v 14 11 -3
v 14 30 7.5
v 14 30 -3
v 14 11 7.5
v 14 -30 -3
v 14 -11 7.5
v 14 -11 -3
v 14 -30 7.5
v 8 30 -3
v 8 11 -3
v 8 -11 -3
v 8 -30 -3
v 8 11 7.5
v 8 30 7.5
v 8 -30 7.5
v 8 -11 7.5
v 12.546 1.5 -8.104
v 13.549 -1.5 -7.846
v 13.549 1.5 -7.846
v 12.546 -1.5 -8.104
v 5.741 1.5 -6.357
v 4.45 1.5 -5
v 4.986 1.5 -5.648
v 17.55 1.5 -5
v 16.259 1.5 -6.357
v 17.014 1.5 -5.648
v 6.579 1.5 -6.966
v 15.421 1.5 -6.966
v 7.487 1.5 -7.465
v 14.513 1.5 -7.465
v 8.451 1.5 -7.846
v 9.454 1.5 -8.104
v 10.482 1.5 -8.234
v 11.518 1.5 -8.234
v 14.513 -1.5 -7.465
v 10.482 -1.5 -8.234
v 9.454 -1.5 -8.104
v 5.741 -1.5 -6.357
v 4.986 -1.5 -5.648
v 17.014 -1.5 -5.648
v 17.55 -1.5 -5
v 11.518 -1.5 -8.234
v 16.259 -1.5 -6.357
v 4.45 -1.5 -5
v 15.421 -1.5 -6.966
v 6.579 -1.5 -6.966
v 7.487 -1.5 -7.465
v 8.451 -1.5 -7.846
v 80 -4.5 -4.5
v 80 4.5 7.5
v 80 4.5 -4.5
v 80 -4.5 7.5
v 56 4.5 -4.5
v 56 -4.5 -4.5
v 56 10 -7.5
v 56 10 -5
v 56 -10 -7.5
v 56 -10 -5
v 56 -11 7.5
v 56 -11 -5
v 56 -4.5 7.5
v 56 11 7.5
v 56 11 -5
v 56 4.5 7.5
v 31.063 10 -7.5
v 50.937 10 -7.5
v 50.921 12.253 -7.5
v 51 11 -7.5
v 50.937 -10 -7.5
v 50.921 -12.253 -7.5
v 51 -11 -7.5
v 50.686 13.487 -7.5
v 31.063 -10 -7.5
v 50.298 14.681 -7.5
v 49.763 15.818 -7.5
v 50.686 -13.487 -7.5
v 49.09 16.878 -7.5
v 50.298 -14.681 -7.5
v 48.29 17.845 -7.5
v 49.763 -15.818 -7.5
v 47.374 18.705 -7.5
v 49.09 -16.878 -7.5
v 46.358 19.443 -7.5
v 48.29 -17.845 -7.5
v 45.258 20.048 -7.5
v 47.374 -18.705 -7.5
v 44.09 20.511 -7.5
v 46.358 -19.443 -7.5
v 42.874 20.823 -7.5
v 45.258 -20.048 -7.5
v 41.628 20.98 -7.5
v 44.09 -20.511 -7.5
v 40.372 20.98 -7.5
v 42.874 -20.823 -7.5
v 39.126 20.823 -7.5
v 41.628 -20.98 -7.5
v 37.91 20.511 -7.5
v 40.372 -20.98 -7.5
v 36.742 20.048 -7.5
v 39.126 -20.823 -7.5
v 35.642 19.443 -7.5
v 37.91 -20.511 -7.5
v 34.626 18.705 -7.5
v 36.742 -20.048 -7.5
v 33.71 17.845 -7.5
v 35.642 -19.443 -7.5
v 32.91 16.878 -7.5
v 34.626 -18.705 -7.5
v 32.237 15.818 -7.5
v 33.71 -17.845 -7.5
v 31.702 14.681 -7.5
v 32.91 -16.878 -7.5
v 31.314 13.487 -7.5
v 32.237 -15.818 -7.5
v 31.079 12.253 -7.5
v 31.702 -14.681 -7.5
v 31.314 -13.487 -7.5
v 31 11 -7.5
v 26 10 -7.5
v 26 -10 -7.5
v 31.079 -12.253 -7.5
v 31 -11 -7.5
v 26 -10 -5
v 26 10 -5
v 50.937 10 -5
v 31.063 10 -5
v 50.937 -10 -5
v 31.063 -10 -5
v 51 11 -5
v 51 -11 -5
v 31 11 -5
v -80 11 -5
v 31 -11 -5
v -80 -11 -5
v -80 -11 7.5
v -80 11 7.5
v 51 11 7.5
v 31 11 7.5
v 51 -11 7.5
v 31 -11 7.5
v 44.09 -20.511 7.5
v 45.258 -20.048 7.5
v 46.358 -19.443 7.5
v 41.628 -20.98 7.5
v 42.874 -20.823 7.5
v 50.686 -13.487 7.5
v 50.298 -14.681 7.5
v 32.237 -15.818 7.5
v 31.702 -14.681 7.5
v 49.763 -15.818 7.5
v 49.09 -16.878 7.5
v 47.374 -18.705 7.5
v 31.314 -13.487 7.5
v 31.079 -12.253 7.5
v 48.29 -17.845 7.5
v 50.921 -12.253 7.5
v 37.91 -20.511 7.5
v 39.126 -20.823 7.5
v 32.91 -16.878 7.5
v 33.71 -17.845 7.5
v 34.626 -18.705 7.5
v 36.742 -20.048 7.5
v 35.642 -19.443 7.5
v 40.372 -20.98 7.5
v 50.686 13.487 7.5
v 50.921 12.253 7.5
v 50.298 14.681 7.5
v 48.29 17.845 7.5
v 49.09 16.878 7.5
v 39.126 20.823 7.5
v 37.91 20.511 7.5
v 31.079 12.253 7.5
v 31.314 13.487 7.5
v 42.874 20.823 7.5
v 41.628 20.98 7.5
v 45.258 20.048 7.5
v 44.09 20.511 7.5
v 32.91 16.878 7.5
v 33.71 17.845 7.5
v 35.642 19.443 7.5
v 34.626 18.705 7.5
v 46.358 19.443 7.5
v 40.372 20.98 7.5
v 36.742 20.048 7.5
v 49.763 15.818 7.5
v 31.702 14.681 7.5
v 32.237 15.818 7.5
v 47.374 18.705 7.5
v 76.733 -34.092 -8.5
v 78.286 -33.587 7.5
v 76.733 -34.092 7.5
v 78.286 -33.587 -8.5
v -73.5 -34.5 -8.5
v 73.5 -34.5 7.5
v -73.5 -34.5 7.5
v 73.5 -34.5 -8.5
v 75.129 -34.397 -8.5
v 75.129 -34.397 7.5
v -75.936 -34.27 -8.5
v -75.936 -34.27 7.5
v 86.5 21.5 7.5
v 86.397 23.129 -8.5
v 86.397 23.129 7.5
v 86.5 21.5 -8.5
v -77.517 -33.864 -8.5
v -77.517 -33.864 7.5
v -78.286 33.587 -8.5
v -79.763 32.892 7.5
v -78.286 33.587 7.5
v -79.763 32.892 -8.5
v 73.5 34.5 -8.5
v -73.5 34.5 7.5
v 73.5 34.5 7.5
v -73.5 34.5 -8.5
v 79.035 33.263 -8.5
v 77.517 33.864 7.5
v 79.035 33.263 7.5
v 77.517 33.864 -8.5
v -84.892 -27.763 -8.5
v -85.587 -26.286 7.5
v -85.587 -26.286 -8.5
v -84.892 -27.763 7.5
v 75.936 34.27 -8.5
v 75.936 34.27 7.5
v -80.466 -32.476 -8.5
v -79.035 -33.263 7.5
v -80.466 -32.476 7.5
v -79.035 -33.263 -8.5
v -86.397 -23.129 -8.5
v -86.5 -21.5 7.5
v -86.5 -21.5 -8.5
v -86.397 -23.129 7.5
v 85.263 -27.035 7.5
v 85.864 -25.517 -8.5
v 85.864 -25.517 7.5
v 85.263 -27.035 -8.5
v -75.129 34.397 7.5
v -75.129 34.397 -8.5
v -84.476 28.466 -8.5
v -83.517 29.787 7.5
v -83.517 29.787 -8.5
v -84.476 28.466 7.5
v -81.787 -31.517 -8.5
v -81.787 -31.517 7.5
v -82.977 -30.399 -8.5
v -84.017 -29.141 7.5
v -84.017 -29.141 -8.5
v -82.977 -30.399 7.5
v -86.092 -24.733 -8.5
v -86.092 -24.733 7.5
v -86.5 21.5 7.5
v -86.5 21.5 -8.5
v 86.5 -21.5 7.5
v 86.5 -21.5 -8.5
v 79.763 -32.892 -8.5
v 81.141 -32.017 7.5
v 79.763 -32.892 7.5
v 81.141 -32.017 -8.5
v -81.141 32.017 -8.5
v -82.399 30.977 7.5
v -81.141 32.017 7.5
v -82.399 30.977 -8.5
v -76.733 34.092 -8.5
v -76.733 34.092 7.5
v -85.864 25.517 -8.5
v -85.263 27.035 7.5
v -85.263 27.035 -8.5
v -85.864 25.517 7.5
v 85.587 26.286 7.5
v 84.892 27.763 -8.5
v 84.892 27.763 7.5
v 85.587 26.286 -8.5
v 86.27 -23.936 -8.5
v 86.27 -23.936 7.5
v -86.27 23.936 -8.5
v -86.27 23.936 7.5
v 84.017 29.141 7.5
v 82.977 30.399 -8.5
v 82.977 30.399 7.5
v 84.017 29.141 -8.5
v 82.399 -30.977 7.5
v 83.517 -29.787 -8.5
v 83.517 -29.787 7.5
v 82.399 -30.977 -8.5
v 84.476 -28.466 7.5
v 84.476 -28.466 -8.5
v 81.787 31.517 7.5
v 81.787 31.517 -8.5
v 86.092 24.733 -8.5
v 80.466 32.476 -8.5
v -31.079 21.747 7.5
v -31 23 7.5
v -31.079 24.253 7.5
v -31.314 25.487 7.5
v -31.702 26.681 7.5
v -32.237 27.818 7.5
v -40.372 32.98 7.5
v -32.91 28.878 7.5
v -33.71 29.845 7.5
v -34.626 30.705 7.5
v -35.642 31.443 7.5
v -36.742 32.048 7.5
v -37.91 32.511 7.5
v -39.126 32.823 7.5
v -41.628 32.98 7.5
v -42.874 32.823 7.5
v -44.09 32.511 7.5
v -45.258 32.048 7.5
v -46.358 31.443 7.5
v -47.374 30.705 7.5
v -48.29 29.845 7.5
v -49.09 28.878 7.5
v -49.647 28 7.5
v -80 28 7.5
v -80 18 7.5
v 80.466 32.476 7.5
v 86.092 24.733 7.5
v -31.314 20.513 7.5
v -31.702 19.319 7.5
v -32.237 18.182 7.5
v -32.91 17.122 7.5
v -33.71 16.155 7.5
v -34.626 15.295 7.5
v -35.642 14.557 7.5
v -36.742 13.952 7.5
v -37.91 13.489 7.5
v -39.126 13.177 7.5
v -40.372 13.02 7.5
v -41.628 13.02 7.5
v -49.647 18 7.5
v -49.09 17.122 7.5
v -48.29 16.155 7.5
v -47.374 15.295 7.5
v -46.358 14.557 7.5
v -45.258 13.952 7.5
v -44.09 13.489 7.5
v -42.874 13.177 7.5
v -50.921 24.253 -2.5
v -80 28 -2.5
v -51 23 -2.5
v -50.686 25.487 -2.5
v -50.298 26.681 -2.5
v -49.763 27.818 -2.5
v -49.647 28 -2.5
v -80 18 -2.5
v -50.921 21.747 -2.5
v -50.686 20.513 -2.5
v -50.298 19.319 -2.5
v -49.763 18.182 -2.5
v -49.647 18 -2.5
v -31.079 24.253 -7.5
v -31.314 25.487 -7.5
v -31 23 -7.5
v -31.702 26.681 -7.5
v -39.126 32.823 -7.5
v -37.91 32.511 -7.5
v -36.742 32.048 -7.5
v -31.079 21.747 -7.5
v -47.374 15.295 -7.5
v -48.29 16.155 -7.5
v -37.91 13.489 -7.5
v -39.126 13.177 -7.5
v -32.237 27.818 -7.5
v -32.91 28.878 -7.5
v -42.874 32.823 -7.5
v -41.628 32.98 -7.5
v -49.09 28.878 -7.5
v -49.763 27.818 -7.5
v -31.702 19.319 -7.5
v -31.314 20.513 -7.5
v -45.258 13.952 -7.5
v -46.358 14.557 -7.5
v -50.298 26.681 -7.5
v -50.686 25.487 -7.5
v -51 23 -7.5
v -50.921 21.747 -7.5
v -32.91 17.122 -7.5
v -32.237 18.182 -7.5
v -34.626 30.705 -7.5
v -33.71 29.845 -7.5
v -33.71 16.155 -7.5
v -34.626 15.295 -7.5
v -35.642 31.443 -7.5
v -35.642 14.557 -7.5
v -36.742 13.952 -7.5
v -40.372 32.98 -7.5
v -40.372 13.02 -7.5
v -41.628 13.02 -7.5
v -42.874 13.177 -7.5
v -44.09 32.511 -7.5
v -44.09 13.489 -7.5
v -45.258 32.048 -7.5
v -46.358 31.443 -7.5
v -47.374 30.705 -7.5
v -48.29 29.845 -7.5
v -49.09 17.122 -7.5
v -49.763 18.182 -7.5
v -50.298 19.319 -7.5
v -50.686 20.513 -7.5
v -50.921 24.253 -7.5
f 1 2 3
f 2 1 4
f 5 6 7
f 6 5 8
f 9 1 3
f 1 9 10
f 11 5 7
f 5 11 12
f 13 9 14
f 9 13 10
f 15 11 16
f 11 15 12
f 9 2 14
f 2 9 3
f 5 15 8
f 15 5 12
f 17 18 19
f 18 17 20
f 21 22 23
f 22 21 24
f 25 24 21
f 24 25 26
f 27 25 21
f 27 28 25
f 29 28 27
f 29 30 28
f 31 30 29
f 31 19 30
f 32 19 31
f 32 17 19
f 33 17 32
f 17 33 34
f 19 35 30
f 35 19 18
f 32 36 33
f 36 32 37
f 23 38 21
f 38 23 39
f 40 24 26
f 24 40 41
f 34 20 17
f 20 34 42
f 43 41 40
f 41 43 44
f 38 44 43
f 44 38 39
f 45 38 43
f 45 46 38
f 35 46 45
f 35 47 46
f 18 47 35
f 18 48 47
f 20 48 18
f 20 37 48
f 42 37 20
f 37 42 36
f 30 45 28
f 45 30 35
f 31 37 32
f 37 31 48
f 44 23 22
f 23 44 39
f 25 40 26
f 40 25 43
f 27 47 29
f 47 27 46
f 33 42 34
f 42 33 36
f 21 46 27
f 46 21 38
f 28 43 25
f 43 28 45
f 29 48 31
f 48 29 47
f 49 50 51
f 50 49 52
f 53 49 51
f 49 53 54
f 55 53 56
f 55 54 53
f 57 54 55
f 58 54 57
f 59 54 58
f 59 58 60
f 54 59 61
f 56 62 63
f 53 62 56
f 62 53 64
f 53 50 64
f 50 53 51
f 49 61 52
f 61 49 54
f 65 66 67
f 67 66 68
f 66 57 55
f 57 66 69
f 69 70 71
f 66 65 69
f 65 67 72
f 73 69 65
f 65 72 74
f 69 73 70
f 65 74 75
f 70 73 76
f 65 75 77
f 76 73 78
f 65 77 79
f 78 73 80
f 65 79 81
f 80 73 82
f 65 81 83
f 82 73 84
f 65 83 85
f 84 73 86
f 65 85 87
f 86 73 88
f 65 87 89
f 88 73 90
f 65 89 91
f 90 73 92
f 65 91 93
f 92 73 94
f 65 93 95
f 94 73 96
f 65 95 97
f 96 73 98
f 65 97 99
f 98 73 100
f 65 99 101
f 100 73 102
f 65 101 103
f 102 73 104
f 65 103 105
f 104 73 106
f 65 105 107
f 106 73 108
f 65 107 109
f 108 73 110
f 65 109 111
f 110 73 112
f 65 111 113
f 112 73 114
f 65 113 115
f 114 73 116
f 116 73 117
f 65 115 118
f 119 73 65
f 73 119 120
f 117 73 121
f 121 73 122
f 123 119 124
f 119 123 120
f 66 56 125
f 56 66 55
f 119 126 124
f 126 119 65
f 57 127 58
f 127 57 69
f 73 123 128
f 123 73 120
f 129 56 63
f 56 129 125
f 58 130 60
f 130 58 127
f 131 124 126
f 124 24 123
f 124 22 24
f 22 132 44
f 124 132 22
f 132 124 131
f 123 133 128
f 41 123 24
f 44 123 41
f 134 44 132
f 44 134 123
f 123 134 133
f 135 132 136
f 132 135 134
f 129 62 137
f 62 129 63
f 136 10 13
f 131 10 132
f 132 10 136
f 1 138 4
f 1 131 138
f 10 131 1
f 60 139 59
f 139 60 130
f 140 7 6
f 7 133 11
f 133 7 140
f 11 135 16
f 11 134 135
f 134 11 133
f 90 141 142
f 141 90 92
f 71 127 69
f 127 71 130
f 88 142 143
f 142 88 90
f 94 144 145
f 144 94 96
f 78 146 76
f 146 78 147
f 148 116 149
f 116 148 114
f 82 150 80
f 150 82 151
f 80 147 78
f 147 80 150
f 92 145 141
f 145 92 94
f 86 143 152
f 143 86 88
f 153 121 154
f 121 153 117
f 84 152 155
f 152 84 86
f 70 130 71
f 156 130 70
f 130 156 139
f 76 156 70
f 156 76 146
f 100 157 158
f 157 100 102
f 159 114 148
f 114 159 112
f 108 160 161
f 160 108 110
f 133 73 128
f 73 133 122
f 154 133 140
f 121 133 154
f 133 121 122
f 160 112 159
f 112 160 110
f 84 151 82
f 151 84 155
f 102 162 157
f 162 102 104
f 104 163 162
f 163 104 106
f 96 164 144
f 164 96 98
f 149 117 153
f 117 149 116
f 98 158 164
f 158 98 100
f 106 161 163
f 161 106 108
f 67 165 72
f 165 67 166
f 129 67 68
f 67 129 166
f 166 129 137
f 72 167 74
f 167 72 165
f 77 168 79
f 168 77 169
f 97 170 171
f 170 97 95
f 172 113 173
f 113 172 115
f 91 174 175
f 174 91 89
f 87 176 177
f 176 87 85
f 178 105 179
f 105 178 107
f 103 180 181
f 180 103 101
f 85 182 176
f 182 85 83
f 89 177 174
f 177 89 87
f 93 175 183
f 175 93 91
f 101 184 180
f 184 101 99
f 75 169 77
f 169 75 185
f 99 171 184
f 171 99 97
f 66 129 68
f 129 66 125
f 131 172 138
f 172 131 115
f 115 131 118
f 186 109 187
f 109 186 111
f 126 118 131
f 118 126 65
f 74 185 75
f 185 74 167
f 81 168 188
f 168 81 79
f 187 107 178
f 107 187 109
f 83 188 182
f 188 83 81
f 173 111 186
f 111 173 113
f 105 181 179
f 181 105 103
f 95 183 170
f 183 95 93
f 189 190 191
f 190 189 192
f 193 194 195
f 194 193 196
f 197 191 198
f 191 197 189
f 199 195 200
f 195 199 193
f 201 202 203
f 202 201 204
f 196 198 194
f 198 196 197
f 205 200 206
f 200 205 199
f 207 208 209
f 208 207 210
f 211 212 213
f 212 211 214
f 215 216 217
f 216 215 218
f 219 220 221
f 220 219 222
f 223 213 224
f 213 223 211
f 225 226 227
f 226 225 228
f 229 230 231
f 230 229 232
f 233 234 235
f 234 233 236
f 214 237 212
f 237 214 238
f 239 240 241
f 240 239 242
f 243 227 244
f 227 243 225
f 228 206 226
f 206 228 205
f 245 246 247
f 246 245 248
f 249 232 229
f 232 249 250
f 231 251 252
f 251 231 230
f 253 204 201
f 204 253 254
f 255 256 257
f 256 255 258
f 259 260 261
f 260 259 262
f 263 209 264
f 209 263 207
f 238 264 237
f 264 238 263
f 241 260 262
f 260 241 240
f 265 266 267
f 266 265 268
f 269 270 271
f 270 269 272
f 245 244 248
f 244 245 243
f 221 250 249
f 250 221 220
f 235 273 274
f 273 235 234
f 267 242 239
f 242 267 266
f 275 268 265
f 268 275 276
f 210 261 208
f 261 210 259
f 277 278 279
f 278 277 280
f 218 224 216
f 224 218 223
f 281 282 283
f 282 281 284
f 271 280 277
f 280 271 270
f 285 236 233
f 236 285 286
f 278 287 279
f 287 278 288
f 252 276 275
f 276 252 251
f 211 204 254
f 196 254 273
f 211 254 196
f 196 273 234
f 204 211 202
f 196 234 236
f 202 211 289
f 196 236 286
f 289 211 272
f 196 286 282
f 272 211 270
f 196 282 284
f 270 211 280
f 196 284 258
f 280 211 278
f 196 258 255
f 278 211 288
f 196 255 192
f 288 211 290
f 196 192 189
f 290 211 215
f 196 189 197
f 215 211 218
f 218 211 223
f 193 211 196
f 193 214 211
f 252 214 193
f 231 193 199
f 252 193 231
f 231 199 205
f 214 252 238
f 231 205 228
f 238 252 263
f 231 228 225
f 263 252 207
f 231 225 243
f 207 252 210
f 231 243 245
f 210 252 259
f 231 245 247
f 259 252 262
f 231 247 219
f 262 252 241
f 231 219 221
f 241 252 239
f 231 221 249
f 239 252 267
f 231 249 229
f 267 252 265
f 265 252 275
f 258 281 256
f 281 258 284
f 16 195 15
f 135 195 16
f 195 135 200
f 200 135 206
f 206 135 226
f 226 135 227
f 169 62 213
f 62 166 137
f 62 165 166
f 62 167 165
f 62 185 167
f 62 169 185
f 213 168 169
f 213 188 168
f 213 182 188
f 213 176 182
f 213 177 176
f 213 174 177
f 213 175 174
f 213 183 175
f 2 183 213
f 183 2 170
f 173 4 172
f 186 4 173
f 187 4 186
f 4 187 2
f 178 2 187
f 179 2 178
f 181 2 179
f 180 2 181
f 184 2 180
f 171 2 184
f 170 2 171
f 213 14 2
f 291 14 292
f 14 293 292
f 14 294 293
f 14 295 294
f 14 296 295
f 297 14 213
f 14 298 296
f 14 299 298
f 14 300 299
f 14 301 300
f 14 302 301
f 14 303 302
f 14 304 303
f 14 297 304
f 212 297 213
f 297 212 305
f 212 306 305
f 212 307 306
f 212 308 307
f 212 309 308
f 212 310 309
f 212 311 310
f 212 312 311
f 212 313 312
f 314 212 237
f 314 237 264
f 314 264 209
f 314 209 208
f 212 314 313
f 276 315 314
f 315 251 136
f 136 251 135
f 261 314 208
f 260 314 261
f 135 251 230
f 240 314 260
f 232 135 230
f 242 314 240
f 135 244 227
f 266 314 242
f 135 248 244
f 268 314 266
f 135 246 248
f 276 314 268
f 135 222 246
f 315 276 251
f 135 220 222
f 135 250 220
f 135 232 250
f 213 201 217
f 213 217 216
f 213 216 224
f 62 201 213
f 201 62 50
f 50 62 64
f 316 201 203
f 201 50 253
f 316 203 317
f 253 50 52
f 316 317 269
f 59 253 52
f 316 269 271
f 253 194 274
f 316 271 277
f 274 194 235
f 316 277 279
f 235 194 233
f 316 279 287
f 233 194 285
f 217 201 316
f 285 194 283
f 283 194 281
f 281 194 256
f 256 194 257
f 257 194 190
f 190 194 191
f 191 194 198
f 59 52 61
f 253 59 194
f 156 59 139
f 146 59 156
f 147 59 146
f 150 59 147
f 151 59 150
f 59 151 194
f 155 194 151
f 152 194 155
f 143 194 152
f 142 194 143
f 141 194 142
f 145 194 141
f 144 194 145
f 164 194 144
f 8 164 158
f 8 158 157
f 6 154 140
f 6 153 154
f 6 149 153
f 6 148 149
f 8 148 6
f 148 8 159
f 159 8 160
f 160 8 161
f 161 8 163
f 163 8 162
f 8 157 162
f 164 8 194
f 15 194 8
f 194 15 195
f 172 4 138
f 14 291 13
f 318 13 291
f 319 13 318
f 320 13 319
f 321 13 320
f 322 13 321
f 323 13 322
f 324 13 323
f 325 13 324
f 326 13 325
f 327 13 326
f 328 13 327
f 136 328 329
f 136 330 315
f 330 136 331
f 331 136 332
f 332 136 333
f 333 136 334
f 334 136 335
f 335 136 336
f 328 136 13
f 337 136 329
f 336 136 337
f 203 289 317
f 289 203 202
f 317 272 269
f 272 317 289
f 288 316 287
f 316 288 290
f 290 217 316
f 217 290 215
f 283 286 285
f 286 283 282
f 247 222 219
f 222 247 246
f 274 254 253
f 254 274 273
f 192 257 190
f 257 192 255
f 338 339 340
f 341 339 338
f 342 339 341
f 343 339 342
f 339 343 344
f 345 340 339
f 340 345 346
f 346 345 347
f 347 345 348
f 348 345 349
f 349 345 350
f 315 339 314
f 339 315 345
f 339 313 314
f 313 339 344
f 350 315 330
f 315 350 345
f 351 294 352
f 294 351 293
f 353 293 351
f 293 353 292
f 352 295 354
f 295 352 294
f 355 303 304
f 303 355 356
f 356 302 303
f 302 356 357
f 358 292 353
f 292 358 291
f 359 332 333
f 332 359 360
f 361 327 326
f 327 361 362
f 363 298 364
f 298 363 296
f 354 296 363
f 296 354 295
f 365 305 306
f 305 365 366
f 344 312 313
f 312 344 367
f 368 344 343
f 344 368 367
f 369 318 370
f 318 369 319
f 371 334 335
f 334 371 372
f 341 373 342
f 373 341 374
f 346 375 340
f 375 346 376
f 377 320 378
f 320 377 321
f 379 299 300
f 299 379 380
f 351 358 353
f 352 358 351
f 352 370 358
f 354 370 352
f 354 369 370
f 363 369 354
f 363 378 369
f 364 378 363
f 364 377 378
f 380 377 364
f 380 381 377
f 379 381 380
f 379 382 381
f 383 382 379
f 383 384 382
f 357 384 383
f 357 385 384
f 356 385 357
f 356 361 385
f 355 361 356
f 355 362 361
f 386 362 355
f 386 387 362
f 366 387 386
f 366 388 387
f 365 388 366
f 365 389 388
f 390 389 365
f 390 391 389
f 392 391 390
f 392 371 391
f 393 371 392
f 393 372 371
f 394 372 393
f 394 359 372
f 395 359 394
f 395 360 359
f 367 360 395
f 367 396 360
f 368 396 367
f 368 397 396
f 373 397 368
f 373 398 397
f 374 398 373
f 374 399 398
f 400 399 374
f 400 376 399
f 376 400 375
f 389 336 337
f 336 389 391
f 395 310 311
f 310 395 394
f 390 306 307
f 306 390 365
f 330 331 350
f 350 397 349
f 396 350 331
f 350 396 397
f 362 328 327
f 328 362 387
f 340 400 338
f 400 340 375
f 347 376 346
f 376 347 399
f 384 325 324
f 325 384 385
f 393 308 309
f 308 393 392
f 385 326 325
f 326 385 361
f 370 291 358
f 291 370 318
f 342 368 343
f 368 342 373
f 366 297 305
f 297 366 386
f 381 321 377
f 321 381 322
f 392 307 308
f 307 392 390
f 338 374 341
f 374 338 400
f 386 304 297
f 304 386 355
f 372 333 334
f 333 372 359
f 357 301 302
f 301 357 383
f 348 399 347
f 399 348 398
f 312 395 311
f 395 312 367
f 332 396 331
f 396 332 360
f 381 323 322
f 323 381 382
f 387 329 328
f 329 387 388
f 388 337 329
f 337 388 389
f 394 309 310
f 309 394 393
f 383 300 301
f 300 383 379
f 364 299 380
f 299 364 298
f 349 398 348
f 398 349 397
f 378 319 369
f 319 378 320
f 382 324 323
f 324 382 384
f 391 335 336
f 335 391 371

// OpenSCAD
/**
 * Batteries Case
 * 
 * @Author  Wilfried Loche
 * @Created Aug 29th, 2018
 */

$fn = 50;

/* [Box] */
// Width/length (mm)
box_width = 173;
// Depth (mm)
box_depth = 69;
// Height (mm)
box_height = 16;
// Corner/radius (mm)
box_corner = 13;

// Holes diameter to put your finger in (mm)
fingers_hole_diameter = 20;

/* [Compass] */
// Compass total length (mm)
compass_length = 160;

// Pin length (mm)
compass_pin_length   = 24;
// Pin diameter (mm)
compass_pin_diameter = 9;

// Head length (mm)
compass_head_length = 30;
// Head width (mm)
compass_head_width  = 20;
// Head depth (mm)
compass_head_depth  = 15;

// Legs width (mm)
compass_legs_width = 22;
// Legs depth (mm)
compass_legs_depth = 10;

// Screw length (mm)
compass_screw_length        = 60;
// Screw diameter (mm)
compass_screw_diameter      = 2;
// Screw position from head/top of the pin (mm)
compass_screw_pos_from_head = 69;

// Wheel on the screw diameter (be generous!) (mm)
compass_screw_dial_diameter = 15;
// Wheel on the screw width (be generous!) (mm)
compass_screw_dial_width    = 3;

/* [Case (small case to put in pencil leads and so on)] */
// Length (mm)
case_length   = 35;
// Diameter (mm)
case_diameter = 10;


difference() {
    translate([0, 0, -box_height/2 - (box_height-compass_head_depth)/2]) box();
    compass_hole();
    compass_fingers_holes();

    case();
    case_finger_hole();
}

module case_finger_hole()
{
    translate([
        -compass_length/2 + case_length + fingers_hole_diameter * .2,
        box_depth/3,
        box_height/2 + (box_height-compass_head_depth)/2
    ])
    cylinder(h = box_height*2, d = fingers_hole_diameter, center = true);
}

module case()
{
    translate([
        -compass_length/2 + case_length/2,
        box_depth/3,
        box_height/2 +- (box_height-compass_head_depth)/2 -case_diameter/2
    ])
    cube([case_length, case_diameter, case_diameter], center = true);
}

module compass_hole()
{
    //### Might not work with any parameters: quick and dirty here!!
    for (a = [0:10])
        translate([0, 0, a])
        compass();
}

module compass_fingers_holes()
{
    for (i = [-1, 1]) {
        translate([
            compass_length/2 - compass_head_length/2 - compass_pin_length,
            i * max(compass_head_width, compass_legs_width)/2,
            box_height/2 + (box_height-compass_head_depth)/2
        ])
        cylinder(h = box_height*2, d = fingers_hole_diameter, center = true);
    }
}

module compass()
{
    compass_pin();
    compass_head();
    compass_legs();
    compass_screw();
}

module compass_pin()
{
    translate([compass_length/2 - compass_pin_length/2, 0, 0])
    cube([compass_pin_length, compass_pin_diameter, compass_pin_diameter], center = true);    
}

module compass_head()
{
    translate([compass_length/2 - compass_head_length/2 - compass_pin_length, 0, 0])
    cube([compass_head_length, compass_head_width, compass_head_depth], center = true);    
}

module compass_legs()
{
    translate([- compass_pin_length/2, 0, 0])
    cube([compass_length - compass_pin_length, compass_legs_width, compass_legs_depth], center = true);    
}

module compass_screw()
{
    translate([compass_length/2 - compass_screw_pos_from_head, 0, 0]) {
        cube([compass_screw_diameter*3, compass_screw_length, compass_screw_diameter*3], center = true); 
    
        rotate([90, 0, 0])
        cylinder(h = compass_screw_dial_width, d = compass_screw_dial_diameter*1.1, center = true);
    }
}

module box()
{
    linear_extrude(height = box_height)
    offset(r = box_corner)
    square([box_width - box_corner*2, box_depth - box_corner*2], center = true);
}
